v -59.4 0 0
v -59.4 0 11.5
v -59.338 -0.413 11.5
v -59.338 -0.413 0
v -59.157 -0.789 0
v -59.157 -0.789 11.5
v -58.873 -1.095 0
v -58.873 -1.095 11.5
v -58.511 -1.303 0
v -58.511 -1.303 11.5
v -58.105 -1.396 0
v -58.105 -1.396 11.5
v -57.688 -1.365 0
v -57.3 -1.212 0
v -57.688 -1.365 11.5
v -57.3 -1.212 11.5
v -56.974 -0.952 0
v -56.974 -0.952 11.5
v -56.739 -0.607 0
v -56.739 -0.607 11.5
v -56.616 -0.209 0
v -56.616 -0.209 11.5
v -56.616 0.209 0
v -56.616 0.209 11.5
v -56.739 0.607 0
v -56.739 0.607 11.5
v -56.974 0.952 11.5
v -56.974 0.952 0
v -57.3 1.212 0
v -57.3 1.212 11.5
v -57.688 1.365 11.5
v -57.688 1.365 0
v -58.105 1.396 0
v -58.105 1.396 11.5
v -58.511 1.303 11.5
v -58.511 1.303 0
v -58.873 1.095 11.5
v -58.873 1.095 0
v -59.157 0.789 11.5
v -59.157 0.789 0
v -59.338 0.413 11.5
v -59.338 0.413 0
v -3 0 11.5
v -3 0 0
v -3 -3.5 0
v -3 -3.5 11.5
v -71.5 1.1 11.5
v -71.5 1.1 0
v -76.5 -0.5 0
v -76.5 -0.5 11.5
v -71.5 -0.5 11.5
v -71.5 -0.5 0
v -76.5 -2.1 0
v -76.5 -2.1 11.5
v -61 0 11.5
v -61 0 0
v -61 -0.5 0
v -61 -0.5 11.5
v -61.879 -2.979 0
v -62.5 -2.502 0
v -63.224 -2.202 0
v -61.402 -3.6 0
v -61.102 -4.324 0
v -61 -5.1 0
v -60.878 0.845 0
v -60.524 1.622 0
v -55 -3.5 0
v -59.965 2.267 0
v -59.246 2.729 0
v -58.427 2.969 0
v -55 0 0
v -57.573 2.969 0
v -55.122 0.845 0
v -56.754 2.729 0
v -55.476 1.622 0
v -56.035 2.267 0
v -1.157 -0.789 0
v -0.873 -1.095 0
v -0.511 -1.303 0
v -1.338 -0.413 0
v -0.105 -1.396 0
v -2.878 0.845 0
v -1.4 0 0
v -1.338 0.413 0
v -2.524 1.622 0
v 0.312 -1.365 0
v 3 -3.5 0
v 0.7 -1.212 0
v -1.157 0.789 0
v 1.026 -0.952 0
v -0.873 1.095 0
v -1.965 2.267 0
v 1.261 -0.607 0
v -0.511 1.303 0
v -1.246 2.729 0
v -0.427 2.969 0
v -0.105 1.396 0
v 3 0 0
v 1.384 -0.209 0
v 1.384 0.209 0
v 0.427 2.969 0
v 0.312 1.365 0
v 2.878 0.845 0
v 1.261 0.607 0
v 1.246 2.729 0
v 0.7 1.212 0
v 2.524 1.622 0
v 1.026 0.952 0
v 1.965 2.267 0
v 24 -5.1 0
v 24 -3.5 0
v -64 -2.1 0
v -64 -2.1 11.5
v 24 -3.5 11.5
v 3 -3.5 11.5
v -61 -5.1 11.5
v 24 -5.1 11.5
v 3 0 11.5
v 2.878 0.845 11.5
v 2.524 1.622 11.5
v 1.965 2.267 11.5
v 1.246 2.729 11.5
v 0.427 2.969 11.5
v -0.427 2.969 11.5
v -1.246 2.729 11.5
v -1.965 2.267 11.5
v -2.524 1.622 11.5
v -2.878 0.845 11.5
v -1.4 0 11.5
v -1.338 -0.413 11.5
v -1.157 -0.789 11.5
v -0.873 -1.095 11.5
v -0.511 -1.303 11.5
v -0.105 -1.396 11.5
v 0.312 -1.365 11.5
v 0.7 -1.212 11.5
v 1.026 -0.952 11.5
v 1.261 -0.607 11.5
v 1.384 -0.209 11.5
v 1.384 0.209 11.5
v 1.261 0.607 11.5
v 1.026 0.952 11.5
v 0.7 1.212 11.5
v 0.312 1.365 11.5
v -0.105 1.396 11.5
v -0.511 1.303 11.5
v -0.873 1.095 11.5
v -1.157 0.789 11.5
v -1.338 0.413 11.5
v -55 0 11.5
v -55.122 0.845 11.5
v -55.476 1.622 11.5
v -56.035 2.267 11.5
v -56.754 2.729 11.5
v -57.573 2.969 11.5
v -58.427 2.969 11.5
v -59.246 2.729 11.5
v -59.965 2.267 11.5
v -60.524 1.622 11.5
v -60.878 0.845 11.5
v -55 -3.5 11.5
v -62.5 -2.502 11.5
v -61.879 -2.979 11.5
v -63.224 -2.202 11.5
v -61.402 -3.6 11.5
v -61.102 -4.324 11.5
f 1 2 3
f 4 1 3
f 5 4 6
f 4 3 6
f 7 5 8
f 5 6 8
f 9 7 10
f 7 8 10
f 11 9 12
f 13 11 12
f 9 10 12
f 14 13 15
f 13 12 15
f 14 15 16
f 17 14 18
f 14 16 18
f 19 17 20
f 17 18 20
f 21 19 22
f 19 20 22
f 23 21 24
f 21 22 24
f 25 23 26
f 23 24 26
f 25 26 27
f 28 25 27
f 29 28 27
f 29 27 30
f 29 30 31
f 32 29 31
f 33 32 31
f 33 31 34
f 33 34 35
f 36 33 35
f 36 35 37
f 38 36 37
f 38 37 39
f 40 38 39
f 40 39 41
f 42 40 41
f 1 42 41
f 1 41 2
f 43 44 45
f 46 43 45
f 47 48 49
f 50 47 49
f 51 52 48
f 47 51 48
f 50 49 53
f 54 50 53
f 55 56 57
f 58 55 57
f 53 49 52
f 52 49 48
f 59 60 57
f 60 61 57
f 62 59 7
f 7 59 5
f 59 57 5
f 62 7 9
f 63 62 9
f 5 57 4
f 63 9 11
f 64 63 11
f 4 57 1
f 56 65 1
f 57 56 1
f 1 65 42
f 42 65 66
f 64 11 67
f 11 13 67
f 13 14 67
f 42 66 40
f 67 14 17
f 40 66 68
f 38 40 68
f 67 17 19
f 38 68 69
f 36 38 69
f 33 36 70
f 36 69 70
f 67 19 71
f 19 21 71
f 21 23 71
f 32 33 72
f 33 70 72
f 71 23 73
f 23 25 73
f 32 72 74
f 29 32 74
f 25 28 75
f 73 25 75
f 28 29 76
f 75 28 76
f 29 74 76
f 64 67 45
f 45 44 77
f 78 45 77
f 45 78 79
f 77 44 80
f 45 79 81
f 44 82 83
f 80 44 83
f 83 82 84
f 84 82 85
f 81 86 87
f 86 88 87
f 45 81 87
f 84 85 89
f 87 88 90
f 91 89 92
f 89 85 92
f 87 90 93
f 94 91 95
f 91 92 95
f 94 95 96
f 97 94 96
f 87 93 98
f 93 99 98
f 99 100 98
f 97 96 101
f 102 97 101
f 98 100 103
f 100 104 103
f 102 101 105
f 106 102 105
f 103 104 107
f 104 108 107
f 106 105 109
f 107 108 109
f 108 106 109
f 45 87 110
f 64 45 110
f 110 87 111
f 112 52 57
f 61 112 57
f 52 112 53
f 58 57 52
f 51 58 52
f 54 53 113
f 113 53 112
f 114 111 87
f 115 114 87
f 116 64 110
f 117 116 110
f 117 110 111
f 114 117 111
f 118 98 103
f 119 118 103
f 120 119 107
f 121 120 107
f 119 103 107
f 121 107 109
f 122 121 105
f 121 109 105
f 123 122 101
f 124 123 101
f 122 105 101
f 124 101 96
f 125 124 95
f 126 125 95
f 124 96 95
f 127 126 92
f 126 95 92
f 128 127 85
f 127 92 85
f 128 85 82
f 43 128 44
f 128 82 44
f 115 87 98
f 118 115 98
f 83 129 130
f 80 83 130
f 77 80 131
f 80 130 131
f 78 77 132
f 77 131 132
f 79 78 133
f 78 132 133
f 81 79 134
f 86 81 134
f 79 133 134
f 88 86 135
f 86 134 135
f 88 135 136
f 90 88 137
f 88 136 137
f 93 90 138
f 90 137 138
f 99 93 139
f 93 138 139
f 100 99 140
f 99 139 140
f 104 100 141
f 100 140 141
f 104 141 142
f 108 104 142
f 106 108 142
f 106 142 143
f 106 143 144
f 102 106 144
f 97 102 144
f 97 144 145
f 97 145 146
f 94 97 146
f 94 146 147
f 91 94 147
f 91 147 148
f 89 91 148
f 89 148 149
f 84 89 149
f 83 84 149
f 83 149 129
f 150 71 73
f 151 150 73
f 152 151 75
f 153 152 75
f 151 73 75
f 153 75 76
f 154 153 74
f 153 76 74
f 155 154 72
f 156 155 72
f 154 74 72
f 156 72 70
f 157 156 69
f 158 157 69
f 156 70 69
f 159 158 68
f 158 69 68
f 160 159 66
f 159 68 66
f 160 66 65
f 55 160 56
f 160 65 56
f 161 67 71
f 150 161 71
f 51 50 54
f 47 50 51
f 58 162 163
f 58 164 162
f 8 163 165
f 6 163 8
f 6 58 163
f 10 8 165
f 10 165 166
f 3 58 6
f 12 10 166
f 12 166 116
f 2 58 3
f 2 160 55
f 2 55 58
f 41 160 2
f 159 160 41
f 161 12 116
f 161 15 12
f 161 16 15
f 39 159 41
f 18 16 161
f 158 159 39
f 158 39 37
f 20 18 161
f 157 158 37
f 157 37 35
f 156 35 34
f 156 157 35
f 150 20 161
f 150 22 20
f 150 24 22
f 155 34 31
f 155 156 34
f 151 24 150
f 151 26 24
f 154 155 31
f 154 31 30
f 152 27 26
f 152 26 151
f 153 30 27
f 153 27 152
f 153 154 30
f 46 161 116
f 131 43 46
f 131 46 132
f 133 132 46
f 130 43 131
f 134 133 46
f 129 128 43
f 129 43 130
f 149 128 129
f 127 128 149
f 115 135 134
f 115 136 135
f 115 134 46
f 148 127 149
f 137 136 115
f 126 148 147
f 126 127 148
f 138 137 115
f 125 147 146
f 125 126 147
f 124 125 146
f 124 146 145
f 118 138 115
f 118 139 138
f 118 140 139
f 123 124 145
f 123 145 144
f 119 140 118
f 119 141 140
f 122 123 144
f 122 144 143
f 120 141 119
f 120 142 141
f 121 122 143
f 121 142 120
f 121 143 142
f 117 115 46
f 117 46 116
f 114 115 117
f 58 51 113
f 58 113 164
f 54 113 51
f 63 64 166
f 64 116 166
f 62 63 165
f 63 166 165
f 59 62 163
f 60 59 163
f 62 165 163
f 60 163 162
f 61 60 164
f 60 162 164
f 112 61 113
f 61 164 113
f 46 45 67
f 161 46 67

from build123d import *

# Parameters (mm, degrees)
F1_DEPTH = 11.5
F2_D     = 2.8
F3_R     = 2.99999


# Not quite as in the source:
# - a fillet or chamfer is up to 0.001 mm smaller than in the source, because OpenCascade refuses the exact size


with BuildPart() as f1:
    # F0 (on Top) → F1 (new body)
    with BuildSketch(Plane.XY):
        with BuildLine():
            Line((-61, -5.1), (24, -5.1))
            Line((24, -5.1), (24, -3.5))
            Line((24, -3.5), (3, -3.5))
            Line((3, -3.5), (3, 0))
            ThreePointArc((3, 0), (0, 3), (-3, 0))
            Line((-3, 0), (-3, -3.5))
            Line((-3, -3.5), (-55, -3.5))
            Line((-55, -3.5), (-55, 0))
            ThreePointArc((-55, 0), (-58, 3), (-61, 0))
            Line((-61, 0), (-61, -0.5))
            Line((-61, -0.5), (-71.5, -0.5))
            Line((-71.5, -0.5), (-71.5, 1.1))
            Line((-71.5, 1.1), (-76.5, -0.5))
            Line((-76.5, -0.5), (-76.5, -2.1))
            Line((-76.5, -2.1), (-61, -2.1))
            Line((-61, -2.1), (-61, -5.1))
        make_face()
    extrude(amount=F1_DEPTH)

    # F2 (through all)
    with Locations(Plane(origin=(0, 0, 0), x_dir=(1, 0, 0), z_dir=(0, 0, -1))):
        with Locations((-58, 0), (0, 0)):
            Hole(F2_D / 2)

    # F3 (radius 3 in the source; OpenCascade refuses exactly that, so slightly less here)
    f3_edges = [f1.edges().sort_by_distance(p)[0] for p in [
        (-61, -2.1, 5.75),
    ]]
    fillet(f3_edges, radius=F3_R)


solid = f1.part
